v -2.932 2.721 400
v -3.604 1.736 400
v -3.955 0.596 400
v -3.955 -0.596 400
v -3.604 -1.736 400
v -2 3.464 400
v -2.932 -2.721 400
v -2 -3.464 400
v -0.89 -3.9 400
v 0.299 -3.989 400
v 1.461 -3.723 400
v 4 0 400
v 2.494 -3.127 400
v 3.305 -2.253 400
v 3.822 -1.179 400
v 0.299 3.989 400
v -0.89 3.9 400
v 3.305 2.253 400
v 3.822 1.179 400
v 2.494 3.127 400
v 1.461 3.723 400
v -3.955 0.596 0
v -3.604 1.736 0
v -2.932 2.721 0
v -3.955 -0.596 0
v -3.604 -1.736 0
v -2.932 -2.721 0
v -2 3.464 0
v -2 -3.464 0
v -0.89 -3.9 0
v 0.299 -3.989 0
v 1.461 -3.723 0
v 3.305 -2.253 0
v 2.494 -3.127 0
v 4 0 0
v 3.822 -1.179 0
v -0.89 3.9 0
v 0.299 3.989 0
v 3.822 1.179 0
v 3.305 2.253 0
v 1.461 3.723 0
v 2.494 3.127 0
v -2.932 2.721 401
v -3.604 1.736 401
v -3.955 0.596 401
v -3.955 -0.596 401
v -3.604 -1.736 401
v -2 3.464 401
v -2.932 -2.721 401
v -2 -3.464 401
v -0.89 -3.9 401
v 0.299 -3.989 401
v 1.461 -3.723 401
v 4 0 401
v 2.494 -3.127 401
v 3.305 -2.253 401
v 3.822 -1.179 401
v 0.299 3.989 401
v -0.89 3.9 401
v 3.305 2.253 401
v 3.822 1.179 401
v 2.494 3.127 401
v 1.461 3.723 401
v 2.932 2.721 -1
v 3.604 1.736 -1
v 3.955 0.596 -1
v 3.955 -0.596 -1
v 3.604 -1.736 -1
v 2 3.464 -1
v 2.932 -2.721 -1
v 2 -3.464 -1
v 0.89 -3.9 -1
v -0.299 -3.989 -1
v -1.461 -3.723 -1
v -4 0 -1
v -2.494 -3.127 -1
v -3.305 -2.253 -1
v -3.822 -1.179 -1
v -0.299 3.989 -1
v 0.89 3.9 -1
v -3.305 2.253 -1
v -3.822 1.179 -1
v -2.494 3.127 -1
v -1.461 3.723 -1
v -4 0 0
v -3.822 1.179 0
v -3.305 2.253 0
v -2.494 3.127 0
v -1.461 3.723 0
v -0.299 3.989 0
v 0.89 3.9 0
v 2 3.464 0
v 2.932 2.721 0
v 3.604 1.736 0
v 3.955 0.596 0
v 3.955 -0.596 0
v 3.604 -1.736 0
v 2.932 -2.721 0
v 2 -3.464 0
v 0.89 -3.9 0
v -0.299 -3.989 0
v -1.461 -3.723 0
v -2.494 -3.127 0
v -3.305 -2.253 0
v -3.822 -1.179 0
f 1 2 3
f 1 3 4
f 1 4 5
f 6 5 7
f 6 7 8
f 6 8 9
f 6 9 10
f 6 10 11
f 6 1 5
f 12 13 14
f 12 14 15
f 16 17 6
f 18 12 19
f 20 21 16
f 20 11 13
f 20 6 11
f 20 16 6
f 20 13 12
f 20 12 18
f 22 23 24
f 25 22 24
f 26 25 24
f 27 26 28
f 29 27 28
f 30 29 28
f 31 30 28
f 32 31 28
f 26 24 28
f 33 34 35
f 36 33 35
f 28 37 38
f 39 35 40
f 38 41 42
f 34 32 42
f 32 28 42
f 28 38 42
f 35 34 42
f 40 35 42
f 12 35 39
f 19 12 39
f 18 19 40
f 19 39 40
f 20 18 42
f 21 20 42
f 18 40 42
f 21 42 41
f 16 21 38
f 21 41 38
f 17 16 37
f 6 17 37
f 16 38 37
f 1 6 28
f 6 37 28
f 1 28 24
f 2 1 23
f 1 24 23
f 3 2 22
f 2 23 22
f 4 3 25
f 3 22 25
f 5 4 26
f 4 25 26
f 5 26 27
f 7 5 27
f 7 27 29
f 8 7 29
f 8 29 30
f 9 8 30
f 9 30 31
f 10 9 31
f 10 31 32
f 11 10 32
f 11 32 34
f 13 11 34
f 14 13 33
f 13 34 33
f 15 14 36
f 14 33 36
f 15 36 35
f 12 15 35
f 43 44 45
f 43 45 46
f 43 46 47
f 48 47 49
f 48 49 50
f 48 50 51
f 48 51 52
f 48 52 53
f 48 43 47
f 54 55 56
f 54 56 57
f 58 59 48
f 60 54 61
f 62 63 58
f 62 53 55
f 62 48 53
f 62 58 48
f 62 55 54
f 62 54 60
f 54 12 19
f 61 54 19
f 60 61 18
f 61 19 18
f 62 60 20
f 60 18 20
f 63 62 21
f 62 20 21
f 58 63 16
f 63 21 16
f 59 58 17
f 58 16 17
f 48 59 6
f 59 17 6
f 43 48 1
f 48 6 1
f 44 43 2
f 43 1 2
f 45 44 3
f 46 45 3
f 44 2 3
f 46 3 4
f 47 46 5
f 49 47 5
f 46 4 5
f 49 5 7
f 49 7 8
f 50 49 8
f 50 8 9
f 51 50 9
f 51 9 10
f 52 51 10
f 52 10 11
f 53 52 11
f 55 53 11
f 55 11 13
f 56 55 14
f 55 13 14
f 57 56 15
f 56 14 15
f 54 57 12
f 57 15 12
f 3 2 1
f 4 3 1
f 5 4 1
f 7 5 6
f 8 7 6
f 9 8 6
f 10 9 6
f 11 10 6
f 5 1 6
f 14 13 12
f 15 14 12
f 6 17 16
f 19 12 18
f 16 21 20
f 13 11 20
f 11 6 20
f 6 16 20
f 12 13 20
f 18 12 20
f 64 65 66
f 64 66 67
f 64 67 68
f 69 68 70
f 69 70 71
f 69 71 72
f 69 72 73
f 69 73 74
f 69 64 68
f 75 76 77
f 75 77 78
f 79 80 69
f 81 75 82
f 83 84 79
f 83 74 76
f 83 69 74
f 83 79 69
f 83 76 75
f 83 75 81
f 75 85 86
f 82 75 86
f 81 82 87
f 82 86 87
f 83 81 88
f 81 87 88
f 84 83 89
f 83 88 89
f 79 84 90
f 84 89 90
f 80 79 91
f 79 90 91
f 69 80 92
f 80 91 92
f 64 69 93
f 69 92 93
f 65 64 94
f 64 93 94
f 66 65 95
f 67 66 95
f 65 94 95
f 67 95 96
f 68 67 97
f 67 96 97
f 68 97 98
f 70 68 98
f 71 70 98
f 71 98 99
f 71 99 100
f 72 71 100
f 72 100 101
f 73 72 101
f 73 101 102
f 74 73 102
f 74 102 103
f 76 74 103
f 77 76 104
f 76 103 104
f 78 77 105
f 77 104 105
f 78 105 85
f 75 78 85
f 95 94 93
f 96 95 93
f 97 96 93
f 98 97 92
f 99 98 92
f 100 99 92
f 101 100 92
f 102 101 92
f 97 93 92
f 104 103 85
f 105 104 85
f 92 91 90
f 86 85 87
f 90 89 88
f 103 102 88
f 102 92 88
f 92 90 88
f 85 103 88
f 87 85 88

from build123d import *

# Parameters (mm, degrees)
SKETCH_1_R      = 4
EXTRUDE_1_DEPTH = 400
SKETCH_4_R      = 4
EXTRUDE_2_DEPTH = 1
SKETCH_5_R      = 4
EXTRUDE_3_DEPTH = 1


with BuildPart() as part:
    # 草图1 → 拉伸1 (new body)
    with BuildSketch(Plane.XY):
        Circle(SKETCH_1_R)
    extrude(amount=EXTRUDE_1_DEPTH)


with BuildPart() as body_2:
    # 草图4 → 拉伸2 (new body)
    with BuildSketch(Plane(origin=(0, 0, 0), x_dir=(-1, 0, 0), z_dir=(0, 0, -1))):
        Circle(SKETCH_4_R)
    extrude(amount=EXTRUDE_2_DEPTH)


with BuildPart() as body_3:
    # 草图5 → 拉伸3 (new body)
    with BuildSketch(Plane.XY.offset(400)):
        Circle(SKETCH_5_R)
    extrude(amount=EXTRUDE_3_DEPTH)


solid = Compound([part.part, body_2.part, body_3.part])
